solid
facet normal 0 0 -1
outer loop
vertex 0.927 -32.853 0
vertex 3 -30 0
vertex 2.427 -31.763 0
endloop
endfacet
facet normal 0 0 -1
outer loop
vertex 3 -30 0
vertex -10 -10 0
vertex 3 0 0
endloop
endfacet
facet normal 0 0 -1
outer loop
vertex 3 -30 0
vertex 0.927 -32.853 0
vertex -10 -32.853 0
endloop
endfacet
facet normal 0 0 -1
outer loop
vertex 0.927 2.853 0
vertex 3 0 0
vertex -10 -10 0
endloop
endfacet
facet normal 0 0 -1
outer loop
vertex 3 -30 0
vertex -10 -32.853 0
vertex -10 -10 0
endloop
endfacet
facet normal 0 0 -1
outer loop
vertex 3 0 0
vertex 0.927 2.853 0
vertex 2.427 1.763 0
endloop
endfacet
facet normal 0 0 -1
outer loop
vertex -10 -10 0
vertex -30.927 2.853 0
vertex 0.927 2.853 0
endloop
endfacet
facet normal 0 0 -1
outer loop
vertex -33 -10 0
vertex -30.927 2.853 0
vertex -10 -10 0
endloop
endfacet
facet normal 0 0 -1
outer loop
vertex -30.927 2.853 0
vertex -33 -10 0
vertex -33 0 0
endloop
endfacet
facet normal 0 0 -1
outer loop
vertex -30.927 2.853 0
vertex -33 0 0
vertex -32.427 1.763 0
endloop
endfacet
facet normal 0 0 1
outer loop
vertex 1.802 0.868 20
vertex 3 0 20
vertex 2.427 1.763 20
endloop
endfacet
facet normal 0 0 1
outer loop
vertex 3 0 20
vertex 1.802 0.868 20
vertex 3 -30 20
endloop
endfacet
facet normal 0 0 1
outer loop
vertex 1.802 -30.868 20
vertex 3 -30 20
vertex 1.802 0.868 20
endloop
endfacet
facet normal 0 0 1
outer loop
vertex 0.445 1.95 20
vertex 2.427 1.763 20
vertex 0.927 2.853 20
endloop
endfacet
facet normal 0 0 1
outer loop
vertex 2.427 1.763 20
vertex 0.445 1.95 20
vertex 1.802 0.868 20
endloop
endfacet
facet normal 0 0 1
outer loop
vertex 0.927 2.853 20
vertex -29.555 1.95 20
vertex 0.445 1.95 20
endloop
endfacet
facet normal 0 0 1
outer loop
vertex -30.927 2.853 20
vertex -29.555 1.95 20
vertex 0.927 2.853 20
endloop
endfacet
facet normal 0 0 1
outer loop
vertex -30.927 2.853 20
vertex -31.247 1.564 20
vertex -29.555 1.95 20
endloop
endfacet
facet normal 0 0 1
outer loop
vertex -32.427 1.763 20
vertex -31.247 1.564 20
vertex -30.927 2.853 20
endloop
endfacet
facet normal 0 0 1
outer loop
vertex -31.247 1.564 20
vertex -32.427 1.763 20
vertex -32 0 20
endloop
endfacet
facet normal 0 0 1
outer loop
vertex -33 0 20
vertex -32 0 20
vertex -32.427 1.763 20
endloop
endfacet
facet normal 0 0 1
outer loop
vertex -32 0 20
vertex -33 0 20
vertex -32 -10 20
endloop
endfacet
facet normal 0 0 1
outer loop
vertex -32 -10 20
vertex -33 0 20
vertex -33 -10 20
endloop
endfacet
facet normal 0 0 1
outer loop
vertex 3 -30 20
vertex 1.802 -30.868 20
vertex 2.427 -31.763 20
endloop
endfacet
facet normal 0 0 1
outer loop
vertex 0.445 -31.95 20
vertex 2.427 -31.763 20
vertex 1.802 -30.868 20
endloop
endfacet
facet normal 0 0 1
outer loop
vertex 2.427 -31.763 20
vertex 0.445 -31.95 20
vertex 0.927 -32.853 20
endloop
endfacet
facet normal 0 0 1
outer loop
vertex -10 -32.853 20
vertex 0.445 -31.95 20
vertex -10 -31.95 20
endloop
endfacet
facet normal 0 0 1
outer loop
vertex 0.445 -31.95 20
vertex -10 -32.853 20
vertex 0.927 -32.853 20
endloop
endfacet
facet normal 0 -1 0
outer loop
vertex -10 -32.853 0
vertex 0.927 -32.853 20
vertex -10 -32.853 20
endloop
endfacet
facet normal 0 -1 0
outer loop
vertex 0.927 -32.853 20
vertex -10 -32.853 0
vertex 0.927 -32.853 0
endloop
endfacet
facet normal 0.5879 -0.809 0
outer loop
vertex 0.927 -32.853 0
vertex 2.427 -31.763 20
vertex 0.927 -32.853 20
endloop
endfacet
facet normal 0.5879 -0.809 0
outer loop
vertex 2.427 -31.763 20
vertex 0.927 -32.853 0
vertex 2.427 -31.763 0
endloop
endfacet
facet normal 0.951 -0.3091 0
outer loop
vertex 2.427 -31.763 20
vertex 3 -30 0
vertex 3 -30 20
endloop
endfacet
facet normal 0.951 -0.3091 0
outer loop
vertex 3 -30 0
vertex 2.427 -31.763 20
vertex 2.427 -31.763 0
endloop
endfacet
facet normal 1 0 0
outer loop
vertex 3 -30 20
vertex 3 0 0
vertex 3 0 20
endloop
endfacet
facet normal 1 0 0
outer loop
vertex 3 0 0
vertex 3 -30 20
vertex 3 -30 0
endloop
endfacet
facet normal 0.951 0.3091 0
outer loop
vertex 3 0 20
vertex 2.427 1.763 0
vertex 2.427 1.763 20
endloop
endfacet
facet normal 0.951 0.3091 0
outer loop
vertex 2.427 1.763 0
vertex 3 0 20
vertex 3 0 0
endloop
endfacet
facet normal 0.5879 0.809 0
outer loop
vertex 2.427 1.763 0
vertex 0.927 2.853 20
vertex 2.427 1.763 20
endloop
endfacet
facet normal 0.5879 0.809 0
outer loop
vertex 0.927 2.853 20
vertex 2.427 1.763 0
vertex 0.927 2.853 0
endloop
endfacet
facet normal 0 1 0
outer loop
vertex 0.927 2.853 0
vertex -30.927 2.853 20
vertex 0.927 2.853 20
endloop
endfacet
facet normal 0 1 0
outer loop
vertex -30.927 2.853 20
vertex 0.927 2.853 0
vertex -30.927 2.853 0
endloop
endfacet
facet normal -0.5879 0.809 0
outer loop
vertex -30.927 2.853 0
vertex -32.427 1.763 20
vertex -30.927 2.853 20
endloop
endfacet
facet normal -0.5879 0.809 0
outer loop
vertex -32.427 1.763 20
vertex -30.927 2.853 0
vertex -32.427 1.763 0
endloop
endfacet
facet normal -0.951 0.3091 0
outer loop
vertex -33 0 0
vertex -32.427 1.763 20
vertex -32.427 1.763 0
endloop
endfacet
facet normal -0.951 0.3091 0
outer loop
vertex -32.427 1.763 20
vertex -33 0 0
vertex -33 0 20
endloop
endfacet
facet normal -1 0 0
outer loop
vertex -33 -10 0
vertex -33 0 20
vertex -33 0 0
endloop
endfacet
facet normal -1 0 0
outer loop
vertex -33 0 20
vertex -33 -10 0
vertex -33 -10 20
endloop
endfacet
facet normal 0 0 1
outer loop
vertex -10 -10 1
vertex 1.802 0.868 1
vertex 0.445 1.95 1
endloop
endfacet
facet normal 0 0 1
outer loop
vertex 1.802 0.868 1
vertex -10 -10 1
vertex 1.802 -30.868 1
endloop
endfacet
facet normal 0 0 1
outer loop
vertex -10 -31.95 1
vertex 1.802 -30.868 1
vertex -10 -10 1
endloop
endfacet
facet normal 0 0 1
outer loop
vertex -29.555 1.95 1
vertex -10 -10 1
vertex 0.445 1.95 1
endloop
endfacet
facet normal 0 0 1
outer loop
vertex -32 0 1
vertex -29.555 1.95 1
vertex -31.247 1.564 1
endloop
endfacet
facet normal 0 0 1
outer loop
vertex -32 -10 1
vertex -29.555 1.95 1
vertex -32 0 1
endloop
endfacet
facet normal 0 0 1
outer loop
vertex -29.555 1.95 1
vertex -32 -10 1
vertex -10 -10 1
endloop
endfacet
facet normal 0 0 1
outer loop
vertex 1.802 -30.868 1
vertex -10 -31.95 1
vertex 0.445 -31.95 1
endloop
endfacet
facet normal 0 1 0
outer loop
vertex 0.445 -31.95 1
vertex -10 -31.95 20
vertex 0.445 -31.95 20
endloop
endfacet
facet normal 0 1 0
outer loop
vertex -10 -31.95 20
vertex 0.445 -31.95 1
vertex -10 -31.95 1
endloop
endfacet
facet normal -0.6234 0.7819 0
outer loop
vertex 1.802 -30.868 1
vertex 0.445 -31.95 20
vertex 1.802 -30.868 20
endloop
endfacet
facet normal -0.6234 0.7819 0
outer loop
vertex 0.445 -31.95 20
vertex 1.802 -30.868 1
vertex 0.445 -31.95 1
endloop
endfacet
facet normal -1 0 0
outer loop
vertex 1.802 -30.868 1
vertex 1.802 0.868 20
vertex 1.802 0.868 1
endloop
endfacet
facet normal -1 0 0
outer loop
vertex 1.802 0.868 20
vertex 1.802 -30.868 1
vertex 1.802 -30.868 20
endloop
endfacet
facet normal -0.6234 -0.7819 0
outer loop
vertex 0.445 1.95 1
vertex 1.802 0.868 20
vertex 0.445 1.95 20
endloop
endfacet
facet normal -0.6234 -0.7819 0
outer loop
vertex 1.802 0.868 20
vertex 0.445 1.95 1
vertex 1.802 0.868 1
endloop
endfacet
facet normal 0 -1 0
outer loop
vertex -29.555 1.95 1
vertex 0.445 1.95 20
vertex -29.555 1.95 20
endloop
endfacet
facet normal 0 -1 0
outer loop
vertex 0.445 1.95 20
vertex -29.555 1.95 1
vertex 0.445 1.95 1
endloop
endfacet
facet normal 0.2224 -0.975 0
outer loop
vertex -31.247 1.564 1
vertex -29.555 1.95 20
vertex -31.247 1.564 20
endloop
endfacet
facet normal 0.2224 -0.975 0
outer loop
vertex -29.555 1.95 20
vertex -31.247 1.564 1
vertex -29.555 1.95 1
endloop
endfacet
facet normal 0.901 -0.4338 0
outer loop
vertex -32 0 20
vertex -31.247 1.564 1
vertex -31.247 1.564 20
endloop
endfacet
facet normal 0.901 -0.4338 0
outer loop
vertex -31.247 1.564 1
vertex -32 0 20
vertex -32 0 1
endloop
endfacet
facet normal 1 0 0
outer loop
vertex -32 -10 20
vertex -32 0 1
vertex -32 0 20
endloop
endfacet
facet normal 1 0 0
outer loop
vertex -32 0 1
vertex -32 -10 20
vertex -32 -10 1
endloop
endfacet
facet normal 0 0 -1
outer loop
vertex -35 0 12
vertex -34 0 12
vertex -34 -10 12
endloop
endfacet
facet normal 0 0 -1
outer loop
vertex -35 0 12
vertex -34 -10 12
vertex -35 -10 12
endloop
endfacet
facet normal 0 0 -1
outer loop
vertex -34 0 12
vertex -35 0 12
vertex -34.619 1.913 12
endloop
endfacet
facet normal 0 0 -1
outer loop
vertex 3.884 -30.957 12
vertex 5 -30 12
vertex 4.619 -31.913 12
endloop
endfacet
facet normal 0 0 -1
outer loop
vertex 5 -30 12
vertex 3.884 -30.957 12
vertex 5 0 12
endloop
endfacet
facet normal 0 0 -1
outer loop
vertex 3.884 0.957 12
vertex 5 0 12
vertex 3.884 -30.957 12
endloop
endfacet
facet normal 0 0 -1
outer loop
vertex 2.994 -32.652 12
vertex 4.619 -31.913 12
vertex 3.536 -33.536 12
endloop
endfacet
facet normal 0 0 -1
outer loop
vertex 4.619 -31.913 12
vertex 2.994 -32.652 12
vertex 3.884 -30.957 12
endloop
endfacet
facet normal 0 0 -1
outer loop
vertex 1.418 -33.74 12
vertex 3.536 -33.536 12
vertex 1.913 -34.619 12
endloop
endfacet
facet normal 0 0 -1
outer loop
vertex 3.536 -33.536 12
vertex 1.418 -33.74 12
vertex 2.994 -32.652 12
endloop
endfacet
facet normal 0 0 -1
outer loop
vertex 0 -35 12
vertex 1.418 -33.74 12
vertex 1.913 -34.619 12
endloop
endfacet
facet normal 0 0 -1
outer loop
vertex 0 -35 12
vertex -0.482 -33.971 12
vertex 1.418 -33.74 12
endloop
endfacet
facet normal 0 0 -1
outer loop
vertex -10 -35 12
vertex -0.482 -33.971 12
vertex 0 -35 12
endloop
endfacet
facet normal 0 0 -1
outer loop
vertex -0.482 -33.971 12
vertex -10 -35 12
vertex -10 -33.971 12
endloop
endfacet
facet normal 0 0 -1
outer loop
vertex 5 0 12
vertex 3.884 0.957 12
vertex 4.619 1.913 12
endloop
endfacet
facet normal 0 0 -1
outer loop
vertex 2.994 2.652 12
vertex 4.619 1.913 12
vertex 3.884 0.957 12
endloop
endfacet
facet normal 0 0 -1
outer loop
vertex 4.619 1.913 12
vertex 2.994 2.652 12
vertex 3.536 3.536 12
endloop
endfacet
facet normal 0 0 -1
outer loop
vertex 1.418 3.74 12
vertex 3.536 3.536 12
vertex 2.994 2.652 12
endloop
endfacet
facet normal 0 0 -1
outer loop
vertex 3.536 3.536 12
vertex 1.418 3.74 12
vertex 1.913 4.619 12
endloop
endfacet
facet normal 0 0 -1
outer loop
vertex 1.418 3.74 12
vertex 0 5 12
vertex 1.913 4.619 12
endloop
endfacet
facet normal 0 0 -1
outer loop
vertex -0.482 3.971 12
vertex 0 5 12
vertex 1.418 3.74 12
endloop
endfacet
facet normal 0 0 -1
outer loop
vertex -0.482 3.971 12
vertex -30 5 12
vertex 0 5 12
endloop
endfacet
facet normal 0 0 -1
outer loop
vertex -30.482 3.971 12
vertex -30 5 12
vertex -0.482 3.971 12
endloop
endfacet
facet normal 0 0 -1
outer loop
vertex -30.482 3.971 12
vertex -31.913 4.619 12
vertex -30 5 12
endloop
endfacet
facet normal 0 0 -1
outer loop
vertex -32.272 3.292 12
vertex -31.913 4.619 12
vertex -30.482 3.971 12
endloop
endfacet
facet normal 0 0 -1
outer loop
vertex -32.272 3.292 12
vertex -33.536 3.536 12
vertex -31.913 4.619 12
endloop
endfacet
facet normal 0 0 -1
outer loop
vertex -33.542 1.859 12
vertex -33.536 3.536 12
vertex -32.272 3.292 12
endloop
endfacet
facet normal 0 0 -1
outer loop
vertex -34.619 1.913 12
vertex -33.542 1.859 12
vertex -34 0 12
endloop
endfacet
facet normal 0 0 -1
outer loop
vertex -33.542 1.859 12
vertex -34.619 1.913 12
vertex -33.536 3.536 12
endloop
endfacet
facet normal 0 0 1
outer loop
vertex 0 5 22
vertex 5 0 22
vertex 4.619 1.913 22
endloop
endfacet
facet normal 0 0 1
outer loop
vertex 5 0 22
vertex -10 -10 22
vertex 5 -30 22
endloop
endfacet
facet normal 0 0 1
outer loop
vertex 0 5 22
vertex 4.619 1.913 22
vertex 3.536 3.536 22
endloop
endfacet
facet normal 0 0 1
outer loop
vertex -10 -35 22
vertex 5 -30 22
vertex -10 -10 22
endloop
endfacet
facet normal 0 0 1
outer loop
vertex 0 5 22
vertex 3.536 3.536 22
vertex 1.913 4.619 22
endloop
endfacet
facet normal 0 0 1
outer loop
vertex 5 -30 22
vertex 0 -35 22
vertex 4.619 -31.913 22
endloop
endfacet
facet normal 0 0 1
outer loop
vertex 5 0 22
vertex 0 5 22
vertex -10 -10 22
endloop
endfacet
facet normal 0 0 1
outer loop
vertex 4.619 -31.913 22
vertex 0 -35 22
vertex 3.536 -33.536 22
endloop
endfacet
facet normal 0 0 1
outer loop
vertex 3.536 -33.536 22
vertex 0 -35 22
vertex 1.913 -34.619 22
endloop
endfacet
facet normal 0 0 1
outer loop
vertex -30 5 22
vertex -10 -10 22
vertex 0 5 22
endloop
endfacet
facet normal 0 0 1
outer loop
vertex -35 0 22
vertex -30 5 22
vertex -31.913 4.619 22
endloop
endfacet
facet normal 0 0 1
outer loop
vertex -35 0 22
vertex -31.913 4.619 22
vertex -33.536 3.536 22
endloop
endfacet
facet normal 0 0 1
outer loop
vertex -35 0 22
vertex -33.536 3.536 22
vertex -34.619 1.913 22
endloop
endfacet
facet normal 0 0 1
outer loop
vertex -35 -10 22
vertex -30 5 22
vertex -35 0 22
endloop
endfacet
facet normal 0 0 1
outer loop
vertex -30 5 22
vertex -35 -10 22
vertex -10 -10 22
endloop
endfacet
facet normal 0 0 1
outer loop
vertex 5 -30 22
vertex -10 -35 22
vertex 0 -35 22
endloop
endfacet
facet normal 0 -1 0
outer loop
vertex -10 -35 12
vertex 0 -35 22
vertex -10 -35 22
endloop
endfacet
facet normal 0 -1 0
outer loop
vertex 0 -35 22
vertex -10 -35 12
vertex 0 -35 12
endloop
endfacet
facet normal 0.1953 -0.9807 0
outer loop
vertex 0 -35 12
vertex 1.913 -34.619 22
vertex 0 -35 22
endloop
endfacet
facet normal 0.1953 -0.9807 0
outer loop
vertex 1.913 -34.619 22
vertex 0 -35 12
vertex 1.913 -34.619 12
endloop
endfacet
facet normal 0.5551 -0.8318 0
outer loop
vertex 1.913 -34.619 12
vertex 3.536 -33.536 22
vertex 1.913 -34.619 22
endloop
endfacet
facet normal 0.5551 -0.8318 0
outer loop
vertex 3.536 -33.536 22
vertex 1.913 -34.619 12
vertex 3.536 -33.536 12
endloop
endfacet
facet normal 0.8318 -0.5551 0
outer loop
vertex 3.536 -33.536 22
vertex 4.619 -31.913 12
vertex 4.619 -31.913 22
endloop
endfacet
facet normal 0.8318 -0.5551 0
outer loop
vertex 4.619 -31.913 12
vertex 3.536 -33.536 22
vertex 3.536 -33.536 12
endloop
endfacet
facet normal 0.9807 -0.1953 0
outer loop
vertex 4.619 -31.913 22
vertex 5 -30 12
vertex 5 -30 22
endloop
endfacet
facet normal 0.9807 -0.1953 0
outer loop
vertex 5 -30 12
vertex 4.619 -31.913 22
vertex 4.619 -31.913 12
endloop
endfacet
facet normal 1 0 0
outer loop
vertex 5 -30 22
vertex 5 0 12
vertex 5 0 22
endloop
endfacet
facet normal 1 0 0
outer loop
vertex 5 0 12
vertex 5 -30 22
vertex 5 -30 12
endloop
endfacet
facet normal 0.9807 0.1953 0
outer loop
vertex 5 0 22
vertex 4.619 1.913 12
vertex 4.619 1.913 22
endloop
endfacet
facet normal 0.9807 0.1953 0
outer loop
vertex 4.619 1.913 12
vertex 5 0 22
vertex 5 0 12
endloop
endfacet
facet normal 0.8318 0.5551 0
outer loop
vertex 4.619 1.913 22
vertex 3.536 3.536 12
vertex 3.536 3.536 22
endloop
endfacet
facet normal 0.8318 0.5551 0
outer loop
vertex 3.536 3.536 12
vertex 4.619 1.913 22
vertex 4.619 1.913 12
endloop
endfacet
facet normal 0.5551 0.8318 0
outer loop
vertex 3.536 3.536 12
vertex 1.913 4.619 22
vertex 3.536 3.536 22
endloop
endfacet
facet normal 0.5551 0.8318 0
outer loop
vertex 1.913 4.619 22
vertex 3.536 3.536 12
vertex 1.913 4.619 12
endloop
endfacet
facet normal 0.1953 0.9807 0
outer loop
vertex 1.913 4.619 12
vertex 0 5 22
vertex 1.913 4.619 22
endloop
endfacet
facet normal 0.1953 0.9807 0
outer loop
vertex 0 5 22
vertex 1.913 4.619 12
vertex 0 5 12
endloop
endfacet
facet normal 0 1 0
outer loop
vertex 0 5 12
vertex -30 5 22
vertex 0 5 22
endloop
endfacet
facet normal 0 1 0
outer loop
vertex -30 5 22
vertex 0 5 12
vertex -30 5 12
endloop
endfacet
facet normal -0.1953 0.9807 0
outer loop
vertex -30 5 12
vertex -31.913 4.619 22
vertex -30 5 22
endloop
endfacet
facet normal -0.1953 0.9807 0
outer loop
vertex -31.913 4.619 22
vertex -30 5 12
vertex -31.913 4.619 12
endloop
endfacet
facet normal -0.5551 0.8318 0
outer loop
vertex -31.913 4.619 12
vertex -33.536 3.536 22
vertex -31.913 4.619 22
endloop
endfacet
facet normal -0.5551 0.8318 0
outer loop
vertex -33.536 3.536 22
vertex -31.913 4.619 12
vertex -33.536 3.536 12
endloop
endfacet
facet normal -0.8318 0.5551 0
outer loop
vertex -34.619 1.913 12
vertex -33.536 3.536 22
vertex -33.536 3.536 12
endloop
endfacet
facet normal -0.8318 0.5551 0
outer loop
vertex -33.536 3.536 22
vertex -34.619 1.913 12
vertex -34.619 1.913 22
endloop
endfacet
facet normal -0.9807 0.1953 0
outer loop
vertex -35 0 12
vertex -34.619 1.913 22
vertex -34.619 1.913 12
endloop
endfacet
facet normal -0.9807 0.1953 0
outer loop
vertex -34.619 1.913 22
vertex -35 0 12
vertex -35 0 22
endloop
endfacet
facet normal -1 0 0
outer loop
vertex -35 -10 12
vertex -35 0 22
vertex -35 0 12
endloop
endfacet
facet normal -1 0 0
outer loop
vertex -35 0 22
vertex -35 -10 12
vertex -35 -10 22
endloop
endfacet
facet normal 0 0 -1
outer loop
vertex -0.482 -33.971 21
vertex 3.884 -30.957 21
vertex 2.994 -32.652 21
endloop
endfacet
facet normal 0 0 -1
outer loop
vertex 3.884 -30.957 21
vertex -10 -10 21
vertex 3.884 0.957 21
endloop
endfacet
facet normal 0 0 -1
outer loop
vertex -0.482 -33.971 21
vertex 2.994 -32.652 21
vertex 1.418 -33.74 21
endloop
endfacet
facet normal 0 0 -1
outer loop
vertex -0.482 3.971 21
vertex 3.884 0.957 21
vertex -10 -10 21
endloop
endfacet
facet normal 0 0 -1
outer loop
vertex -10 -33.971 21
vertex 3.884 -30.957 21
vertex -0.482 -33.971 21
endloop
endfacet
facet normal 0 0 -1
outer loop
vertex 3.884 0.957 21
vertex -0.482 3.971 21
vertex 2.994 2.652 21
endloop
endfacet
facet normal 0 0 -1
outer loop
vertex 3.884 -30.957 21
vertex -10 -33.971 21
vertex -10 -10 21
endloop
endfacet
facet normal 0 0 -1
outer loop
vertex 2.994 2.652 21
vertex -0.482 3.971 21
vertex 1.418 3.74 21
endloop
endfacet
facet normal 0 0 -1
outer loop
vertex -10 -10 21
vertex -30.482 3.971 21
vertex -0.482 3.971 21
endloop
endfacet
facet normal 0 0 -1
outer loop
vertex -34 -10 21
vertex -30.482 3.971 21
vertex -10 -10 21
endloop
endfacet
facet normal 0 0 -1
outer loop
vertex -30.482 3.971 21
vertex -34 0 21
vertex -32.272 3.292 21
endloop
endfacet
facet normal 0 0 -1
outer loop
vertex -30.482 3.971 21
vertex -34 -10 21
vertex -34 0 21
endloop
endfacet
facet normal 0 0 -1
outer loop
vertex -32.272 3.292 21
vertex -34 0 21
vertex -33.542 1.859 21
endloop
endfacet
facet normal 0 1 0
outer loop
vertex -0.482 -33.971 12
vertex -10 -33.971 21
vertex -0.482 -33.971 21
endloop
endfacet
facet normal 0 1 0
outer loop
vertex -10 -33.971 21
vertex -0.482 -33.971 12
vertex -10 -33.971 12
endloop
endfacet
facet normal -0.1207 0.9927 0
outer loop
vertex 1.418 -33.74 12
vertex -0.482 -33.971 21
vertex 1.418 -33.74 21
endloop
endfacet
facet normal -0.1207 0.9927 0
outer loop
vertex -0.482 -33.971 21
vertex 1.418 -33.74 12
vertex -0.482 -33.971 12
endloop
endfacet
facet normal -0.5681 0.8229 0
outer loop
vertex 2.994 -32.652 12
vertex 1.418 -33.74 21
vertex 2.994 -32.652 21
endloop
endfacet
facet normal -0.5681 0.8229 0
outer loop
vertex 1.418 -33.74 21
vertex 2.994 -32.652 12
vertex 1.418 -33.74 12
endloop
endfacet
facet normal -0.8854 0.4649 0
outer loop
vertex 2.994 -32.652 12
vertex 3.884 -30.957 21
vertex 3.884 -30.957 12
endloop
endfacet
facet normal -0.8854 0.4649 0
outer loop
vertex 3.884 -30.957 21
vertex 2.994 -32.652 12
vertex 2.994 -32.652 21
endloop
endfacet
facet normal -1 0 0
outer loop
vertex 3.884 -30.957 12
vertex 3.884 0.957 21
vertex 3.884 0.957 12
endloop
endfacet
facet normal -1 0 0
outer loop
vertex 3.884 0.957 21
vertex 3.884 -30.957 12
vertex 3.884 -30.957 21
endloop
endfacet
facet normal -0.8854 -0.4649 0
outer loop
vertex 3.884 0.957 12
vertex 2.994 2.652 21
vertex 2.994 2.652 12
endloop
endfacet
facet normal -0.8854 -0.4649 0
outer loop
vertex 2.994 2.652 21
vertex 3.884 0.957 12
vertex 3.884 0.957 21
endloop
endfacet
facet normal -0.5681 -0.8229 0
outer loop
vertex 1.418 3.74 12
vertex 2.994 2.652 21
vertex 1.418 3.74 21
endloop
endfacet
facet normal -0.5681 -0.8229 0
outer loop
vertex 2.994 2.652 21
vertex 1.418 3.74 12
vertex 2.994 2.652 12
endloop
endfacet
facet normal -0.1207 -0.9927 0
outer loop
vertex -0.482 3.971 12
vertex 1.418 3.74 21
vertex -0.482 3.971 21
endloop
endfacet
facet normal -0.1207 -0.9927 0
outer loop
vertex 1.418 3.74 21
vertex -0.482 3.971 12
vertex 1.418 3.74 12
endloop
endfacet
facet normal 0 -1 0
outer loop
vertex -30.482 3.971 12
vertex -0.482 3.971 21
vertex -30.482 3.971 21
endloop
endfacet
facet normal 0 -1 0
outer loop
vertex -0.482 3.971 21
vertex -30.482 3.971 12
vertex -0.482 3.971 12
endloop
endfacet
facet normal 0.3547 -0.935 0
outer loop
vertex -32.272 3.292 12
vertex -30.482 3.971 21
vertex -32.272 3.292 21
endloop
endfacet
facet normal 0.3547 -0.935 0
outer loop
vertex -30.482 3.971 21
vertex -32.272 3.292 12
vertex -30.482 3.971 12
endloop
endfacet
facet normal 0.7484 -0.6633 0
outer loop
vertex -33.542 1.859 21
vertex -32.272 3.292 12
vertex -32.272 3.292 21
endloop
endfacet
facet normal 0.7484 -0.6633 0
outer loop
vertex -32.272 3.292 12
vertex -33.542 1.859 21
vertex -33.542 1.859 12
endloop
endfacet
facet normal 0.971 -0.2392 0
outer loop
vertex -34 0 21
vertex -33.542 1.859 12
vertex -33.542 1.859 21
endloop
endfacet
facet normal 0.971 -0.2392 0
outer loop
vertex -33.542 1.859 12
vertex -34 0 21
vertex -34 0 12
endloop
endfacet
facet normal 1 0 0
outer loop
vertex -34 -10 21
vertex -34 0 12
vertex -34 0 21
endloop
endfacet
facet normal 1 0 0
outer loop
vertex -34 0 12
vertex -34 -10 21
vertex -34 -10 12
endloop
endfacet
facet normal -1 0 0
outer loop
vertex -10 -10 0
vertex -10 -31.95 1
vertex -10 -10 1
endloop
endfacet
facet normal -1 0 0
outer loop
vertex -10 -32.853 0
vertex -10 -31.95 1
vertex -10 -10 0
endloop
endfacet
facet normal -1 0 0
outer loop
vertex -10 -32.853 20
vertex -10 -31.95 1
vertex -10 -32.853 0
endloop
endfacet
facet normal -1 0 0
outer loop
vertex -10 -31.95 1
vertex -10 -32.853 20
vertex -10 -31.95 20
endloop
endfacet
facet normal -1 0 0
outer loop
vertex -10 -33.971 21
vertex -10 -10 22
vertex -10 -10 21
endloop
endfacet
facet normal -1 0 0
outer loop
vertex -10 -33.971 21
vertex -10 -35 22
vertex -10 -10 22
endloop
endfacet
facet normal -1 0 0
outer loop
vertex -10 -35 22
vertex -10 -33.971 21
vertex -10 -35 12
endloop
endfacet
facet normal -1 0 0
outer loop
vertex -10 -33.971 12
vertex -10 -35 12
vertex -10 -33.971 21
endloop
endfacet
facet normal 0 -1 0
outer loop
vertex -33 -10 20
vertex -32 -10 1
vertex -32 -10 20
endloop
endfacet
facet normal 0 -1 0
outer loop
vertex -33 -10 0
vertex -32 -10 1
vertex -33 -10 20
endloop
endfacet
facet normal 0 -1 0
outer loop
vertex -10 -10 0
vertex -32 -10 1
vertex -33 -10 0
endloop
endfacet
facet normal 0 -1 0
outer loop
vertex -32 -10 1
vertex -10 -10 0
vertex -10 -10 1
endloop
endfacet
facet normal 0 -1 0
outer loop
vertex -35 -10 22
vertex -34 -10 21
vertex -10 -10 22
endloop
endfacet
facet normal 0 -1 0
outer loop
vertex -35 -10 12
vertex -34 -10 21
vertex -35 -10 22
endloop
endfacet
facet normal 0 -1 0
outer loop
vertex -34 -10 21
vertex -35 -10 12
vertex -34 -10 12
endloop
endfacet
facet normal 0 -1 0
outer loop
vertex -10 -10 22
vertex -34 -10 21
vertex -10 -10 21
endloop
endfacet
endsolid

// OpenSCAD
data=[[0,0],[0,30],[18,30],
      [18,15],[30,15],[30,0]];
a=90;
echo(sin(a*10)*10+20,
    cos(a*10)*10+20);
rotate([0,0,180]){
test(sin(a*10)*10+20,
    cos(a*10)*10+20);
};
//scan();
module scan(){      
    for(i=[0:2]){
        for(j=[0:2]){
            translate([i*50,j*50]){
               echo(i*10+10,j*10+10);
               test(i*10+10,j*10+10);
            };
        };
    };
};
module test(a,b){
    difference(){
        assembly(a,b);
        translate([10,10,-30]){
            cube([100,100,100]);
        };
    };
};
module assembly(a,b){
    box(3,1,a);
    translate([0,0,2+a-b]){
        box(5,-1,b);
    };
};

module box(r,t,h){
    difference(){
        linear_extrude(h){
            shape(r);
        };
        translate([0,0,t]){
            linear_extrude(h){
                shape(r-1);
            };
        };
    };
};
module shape(r){
    minkowski(){
        polygon(data);
        circle(r);
    };
};
